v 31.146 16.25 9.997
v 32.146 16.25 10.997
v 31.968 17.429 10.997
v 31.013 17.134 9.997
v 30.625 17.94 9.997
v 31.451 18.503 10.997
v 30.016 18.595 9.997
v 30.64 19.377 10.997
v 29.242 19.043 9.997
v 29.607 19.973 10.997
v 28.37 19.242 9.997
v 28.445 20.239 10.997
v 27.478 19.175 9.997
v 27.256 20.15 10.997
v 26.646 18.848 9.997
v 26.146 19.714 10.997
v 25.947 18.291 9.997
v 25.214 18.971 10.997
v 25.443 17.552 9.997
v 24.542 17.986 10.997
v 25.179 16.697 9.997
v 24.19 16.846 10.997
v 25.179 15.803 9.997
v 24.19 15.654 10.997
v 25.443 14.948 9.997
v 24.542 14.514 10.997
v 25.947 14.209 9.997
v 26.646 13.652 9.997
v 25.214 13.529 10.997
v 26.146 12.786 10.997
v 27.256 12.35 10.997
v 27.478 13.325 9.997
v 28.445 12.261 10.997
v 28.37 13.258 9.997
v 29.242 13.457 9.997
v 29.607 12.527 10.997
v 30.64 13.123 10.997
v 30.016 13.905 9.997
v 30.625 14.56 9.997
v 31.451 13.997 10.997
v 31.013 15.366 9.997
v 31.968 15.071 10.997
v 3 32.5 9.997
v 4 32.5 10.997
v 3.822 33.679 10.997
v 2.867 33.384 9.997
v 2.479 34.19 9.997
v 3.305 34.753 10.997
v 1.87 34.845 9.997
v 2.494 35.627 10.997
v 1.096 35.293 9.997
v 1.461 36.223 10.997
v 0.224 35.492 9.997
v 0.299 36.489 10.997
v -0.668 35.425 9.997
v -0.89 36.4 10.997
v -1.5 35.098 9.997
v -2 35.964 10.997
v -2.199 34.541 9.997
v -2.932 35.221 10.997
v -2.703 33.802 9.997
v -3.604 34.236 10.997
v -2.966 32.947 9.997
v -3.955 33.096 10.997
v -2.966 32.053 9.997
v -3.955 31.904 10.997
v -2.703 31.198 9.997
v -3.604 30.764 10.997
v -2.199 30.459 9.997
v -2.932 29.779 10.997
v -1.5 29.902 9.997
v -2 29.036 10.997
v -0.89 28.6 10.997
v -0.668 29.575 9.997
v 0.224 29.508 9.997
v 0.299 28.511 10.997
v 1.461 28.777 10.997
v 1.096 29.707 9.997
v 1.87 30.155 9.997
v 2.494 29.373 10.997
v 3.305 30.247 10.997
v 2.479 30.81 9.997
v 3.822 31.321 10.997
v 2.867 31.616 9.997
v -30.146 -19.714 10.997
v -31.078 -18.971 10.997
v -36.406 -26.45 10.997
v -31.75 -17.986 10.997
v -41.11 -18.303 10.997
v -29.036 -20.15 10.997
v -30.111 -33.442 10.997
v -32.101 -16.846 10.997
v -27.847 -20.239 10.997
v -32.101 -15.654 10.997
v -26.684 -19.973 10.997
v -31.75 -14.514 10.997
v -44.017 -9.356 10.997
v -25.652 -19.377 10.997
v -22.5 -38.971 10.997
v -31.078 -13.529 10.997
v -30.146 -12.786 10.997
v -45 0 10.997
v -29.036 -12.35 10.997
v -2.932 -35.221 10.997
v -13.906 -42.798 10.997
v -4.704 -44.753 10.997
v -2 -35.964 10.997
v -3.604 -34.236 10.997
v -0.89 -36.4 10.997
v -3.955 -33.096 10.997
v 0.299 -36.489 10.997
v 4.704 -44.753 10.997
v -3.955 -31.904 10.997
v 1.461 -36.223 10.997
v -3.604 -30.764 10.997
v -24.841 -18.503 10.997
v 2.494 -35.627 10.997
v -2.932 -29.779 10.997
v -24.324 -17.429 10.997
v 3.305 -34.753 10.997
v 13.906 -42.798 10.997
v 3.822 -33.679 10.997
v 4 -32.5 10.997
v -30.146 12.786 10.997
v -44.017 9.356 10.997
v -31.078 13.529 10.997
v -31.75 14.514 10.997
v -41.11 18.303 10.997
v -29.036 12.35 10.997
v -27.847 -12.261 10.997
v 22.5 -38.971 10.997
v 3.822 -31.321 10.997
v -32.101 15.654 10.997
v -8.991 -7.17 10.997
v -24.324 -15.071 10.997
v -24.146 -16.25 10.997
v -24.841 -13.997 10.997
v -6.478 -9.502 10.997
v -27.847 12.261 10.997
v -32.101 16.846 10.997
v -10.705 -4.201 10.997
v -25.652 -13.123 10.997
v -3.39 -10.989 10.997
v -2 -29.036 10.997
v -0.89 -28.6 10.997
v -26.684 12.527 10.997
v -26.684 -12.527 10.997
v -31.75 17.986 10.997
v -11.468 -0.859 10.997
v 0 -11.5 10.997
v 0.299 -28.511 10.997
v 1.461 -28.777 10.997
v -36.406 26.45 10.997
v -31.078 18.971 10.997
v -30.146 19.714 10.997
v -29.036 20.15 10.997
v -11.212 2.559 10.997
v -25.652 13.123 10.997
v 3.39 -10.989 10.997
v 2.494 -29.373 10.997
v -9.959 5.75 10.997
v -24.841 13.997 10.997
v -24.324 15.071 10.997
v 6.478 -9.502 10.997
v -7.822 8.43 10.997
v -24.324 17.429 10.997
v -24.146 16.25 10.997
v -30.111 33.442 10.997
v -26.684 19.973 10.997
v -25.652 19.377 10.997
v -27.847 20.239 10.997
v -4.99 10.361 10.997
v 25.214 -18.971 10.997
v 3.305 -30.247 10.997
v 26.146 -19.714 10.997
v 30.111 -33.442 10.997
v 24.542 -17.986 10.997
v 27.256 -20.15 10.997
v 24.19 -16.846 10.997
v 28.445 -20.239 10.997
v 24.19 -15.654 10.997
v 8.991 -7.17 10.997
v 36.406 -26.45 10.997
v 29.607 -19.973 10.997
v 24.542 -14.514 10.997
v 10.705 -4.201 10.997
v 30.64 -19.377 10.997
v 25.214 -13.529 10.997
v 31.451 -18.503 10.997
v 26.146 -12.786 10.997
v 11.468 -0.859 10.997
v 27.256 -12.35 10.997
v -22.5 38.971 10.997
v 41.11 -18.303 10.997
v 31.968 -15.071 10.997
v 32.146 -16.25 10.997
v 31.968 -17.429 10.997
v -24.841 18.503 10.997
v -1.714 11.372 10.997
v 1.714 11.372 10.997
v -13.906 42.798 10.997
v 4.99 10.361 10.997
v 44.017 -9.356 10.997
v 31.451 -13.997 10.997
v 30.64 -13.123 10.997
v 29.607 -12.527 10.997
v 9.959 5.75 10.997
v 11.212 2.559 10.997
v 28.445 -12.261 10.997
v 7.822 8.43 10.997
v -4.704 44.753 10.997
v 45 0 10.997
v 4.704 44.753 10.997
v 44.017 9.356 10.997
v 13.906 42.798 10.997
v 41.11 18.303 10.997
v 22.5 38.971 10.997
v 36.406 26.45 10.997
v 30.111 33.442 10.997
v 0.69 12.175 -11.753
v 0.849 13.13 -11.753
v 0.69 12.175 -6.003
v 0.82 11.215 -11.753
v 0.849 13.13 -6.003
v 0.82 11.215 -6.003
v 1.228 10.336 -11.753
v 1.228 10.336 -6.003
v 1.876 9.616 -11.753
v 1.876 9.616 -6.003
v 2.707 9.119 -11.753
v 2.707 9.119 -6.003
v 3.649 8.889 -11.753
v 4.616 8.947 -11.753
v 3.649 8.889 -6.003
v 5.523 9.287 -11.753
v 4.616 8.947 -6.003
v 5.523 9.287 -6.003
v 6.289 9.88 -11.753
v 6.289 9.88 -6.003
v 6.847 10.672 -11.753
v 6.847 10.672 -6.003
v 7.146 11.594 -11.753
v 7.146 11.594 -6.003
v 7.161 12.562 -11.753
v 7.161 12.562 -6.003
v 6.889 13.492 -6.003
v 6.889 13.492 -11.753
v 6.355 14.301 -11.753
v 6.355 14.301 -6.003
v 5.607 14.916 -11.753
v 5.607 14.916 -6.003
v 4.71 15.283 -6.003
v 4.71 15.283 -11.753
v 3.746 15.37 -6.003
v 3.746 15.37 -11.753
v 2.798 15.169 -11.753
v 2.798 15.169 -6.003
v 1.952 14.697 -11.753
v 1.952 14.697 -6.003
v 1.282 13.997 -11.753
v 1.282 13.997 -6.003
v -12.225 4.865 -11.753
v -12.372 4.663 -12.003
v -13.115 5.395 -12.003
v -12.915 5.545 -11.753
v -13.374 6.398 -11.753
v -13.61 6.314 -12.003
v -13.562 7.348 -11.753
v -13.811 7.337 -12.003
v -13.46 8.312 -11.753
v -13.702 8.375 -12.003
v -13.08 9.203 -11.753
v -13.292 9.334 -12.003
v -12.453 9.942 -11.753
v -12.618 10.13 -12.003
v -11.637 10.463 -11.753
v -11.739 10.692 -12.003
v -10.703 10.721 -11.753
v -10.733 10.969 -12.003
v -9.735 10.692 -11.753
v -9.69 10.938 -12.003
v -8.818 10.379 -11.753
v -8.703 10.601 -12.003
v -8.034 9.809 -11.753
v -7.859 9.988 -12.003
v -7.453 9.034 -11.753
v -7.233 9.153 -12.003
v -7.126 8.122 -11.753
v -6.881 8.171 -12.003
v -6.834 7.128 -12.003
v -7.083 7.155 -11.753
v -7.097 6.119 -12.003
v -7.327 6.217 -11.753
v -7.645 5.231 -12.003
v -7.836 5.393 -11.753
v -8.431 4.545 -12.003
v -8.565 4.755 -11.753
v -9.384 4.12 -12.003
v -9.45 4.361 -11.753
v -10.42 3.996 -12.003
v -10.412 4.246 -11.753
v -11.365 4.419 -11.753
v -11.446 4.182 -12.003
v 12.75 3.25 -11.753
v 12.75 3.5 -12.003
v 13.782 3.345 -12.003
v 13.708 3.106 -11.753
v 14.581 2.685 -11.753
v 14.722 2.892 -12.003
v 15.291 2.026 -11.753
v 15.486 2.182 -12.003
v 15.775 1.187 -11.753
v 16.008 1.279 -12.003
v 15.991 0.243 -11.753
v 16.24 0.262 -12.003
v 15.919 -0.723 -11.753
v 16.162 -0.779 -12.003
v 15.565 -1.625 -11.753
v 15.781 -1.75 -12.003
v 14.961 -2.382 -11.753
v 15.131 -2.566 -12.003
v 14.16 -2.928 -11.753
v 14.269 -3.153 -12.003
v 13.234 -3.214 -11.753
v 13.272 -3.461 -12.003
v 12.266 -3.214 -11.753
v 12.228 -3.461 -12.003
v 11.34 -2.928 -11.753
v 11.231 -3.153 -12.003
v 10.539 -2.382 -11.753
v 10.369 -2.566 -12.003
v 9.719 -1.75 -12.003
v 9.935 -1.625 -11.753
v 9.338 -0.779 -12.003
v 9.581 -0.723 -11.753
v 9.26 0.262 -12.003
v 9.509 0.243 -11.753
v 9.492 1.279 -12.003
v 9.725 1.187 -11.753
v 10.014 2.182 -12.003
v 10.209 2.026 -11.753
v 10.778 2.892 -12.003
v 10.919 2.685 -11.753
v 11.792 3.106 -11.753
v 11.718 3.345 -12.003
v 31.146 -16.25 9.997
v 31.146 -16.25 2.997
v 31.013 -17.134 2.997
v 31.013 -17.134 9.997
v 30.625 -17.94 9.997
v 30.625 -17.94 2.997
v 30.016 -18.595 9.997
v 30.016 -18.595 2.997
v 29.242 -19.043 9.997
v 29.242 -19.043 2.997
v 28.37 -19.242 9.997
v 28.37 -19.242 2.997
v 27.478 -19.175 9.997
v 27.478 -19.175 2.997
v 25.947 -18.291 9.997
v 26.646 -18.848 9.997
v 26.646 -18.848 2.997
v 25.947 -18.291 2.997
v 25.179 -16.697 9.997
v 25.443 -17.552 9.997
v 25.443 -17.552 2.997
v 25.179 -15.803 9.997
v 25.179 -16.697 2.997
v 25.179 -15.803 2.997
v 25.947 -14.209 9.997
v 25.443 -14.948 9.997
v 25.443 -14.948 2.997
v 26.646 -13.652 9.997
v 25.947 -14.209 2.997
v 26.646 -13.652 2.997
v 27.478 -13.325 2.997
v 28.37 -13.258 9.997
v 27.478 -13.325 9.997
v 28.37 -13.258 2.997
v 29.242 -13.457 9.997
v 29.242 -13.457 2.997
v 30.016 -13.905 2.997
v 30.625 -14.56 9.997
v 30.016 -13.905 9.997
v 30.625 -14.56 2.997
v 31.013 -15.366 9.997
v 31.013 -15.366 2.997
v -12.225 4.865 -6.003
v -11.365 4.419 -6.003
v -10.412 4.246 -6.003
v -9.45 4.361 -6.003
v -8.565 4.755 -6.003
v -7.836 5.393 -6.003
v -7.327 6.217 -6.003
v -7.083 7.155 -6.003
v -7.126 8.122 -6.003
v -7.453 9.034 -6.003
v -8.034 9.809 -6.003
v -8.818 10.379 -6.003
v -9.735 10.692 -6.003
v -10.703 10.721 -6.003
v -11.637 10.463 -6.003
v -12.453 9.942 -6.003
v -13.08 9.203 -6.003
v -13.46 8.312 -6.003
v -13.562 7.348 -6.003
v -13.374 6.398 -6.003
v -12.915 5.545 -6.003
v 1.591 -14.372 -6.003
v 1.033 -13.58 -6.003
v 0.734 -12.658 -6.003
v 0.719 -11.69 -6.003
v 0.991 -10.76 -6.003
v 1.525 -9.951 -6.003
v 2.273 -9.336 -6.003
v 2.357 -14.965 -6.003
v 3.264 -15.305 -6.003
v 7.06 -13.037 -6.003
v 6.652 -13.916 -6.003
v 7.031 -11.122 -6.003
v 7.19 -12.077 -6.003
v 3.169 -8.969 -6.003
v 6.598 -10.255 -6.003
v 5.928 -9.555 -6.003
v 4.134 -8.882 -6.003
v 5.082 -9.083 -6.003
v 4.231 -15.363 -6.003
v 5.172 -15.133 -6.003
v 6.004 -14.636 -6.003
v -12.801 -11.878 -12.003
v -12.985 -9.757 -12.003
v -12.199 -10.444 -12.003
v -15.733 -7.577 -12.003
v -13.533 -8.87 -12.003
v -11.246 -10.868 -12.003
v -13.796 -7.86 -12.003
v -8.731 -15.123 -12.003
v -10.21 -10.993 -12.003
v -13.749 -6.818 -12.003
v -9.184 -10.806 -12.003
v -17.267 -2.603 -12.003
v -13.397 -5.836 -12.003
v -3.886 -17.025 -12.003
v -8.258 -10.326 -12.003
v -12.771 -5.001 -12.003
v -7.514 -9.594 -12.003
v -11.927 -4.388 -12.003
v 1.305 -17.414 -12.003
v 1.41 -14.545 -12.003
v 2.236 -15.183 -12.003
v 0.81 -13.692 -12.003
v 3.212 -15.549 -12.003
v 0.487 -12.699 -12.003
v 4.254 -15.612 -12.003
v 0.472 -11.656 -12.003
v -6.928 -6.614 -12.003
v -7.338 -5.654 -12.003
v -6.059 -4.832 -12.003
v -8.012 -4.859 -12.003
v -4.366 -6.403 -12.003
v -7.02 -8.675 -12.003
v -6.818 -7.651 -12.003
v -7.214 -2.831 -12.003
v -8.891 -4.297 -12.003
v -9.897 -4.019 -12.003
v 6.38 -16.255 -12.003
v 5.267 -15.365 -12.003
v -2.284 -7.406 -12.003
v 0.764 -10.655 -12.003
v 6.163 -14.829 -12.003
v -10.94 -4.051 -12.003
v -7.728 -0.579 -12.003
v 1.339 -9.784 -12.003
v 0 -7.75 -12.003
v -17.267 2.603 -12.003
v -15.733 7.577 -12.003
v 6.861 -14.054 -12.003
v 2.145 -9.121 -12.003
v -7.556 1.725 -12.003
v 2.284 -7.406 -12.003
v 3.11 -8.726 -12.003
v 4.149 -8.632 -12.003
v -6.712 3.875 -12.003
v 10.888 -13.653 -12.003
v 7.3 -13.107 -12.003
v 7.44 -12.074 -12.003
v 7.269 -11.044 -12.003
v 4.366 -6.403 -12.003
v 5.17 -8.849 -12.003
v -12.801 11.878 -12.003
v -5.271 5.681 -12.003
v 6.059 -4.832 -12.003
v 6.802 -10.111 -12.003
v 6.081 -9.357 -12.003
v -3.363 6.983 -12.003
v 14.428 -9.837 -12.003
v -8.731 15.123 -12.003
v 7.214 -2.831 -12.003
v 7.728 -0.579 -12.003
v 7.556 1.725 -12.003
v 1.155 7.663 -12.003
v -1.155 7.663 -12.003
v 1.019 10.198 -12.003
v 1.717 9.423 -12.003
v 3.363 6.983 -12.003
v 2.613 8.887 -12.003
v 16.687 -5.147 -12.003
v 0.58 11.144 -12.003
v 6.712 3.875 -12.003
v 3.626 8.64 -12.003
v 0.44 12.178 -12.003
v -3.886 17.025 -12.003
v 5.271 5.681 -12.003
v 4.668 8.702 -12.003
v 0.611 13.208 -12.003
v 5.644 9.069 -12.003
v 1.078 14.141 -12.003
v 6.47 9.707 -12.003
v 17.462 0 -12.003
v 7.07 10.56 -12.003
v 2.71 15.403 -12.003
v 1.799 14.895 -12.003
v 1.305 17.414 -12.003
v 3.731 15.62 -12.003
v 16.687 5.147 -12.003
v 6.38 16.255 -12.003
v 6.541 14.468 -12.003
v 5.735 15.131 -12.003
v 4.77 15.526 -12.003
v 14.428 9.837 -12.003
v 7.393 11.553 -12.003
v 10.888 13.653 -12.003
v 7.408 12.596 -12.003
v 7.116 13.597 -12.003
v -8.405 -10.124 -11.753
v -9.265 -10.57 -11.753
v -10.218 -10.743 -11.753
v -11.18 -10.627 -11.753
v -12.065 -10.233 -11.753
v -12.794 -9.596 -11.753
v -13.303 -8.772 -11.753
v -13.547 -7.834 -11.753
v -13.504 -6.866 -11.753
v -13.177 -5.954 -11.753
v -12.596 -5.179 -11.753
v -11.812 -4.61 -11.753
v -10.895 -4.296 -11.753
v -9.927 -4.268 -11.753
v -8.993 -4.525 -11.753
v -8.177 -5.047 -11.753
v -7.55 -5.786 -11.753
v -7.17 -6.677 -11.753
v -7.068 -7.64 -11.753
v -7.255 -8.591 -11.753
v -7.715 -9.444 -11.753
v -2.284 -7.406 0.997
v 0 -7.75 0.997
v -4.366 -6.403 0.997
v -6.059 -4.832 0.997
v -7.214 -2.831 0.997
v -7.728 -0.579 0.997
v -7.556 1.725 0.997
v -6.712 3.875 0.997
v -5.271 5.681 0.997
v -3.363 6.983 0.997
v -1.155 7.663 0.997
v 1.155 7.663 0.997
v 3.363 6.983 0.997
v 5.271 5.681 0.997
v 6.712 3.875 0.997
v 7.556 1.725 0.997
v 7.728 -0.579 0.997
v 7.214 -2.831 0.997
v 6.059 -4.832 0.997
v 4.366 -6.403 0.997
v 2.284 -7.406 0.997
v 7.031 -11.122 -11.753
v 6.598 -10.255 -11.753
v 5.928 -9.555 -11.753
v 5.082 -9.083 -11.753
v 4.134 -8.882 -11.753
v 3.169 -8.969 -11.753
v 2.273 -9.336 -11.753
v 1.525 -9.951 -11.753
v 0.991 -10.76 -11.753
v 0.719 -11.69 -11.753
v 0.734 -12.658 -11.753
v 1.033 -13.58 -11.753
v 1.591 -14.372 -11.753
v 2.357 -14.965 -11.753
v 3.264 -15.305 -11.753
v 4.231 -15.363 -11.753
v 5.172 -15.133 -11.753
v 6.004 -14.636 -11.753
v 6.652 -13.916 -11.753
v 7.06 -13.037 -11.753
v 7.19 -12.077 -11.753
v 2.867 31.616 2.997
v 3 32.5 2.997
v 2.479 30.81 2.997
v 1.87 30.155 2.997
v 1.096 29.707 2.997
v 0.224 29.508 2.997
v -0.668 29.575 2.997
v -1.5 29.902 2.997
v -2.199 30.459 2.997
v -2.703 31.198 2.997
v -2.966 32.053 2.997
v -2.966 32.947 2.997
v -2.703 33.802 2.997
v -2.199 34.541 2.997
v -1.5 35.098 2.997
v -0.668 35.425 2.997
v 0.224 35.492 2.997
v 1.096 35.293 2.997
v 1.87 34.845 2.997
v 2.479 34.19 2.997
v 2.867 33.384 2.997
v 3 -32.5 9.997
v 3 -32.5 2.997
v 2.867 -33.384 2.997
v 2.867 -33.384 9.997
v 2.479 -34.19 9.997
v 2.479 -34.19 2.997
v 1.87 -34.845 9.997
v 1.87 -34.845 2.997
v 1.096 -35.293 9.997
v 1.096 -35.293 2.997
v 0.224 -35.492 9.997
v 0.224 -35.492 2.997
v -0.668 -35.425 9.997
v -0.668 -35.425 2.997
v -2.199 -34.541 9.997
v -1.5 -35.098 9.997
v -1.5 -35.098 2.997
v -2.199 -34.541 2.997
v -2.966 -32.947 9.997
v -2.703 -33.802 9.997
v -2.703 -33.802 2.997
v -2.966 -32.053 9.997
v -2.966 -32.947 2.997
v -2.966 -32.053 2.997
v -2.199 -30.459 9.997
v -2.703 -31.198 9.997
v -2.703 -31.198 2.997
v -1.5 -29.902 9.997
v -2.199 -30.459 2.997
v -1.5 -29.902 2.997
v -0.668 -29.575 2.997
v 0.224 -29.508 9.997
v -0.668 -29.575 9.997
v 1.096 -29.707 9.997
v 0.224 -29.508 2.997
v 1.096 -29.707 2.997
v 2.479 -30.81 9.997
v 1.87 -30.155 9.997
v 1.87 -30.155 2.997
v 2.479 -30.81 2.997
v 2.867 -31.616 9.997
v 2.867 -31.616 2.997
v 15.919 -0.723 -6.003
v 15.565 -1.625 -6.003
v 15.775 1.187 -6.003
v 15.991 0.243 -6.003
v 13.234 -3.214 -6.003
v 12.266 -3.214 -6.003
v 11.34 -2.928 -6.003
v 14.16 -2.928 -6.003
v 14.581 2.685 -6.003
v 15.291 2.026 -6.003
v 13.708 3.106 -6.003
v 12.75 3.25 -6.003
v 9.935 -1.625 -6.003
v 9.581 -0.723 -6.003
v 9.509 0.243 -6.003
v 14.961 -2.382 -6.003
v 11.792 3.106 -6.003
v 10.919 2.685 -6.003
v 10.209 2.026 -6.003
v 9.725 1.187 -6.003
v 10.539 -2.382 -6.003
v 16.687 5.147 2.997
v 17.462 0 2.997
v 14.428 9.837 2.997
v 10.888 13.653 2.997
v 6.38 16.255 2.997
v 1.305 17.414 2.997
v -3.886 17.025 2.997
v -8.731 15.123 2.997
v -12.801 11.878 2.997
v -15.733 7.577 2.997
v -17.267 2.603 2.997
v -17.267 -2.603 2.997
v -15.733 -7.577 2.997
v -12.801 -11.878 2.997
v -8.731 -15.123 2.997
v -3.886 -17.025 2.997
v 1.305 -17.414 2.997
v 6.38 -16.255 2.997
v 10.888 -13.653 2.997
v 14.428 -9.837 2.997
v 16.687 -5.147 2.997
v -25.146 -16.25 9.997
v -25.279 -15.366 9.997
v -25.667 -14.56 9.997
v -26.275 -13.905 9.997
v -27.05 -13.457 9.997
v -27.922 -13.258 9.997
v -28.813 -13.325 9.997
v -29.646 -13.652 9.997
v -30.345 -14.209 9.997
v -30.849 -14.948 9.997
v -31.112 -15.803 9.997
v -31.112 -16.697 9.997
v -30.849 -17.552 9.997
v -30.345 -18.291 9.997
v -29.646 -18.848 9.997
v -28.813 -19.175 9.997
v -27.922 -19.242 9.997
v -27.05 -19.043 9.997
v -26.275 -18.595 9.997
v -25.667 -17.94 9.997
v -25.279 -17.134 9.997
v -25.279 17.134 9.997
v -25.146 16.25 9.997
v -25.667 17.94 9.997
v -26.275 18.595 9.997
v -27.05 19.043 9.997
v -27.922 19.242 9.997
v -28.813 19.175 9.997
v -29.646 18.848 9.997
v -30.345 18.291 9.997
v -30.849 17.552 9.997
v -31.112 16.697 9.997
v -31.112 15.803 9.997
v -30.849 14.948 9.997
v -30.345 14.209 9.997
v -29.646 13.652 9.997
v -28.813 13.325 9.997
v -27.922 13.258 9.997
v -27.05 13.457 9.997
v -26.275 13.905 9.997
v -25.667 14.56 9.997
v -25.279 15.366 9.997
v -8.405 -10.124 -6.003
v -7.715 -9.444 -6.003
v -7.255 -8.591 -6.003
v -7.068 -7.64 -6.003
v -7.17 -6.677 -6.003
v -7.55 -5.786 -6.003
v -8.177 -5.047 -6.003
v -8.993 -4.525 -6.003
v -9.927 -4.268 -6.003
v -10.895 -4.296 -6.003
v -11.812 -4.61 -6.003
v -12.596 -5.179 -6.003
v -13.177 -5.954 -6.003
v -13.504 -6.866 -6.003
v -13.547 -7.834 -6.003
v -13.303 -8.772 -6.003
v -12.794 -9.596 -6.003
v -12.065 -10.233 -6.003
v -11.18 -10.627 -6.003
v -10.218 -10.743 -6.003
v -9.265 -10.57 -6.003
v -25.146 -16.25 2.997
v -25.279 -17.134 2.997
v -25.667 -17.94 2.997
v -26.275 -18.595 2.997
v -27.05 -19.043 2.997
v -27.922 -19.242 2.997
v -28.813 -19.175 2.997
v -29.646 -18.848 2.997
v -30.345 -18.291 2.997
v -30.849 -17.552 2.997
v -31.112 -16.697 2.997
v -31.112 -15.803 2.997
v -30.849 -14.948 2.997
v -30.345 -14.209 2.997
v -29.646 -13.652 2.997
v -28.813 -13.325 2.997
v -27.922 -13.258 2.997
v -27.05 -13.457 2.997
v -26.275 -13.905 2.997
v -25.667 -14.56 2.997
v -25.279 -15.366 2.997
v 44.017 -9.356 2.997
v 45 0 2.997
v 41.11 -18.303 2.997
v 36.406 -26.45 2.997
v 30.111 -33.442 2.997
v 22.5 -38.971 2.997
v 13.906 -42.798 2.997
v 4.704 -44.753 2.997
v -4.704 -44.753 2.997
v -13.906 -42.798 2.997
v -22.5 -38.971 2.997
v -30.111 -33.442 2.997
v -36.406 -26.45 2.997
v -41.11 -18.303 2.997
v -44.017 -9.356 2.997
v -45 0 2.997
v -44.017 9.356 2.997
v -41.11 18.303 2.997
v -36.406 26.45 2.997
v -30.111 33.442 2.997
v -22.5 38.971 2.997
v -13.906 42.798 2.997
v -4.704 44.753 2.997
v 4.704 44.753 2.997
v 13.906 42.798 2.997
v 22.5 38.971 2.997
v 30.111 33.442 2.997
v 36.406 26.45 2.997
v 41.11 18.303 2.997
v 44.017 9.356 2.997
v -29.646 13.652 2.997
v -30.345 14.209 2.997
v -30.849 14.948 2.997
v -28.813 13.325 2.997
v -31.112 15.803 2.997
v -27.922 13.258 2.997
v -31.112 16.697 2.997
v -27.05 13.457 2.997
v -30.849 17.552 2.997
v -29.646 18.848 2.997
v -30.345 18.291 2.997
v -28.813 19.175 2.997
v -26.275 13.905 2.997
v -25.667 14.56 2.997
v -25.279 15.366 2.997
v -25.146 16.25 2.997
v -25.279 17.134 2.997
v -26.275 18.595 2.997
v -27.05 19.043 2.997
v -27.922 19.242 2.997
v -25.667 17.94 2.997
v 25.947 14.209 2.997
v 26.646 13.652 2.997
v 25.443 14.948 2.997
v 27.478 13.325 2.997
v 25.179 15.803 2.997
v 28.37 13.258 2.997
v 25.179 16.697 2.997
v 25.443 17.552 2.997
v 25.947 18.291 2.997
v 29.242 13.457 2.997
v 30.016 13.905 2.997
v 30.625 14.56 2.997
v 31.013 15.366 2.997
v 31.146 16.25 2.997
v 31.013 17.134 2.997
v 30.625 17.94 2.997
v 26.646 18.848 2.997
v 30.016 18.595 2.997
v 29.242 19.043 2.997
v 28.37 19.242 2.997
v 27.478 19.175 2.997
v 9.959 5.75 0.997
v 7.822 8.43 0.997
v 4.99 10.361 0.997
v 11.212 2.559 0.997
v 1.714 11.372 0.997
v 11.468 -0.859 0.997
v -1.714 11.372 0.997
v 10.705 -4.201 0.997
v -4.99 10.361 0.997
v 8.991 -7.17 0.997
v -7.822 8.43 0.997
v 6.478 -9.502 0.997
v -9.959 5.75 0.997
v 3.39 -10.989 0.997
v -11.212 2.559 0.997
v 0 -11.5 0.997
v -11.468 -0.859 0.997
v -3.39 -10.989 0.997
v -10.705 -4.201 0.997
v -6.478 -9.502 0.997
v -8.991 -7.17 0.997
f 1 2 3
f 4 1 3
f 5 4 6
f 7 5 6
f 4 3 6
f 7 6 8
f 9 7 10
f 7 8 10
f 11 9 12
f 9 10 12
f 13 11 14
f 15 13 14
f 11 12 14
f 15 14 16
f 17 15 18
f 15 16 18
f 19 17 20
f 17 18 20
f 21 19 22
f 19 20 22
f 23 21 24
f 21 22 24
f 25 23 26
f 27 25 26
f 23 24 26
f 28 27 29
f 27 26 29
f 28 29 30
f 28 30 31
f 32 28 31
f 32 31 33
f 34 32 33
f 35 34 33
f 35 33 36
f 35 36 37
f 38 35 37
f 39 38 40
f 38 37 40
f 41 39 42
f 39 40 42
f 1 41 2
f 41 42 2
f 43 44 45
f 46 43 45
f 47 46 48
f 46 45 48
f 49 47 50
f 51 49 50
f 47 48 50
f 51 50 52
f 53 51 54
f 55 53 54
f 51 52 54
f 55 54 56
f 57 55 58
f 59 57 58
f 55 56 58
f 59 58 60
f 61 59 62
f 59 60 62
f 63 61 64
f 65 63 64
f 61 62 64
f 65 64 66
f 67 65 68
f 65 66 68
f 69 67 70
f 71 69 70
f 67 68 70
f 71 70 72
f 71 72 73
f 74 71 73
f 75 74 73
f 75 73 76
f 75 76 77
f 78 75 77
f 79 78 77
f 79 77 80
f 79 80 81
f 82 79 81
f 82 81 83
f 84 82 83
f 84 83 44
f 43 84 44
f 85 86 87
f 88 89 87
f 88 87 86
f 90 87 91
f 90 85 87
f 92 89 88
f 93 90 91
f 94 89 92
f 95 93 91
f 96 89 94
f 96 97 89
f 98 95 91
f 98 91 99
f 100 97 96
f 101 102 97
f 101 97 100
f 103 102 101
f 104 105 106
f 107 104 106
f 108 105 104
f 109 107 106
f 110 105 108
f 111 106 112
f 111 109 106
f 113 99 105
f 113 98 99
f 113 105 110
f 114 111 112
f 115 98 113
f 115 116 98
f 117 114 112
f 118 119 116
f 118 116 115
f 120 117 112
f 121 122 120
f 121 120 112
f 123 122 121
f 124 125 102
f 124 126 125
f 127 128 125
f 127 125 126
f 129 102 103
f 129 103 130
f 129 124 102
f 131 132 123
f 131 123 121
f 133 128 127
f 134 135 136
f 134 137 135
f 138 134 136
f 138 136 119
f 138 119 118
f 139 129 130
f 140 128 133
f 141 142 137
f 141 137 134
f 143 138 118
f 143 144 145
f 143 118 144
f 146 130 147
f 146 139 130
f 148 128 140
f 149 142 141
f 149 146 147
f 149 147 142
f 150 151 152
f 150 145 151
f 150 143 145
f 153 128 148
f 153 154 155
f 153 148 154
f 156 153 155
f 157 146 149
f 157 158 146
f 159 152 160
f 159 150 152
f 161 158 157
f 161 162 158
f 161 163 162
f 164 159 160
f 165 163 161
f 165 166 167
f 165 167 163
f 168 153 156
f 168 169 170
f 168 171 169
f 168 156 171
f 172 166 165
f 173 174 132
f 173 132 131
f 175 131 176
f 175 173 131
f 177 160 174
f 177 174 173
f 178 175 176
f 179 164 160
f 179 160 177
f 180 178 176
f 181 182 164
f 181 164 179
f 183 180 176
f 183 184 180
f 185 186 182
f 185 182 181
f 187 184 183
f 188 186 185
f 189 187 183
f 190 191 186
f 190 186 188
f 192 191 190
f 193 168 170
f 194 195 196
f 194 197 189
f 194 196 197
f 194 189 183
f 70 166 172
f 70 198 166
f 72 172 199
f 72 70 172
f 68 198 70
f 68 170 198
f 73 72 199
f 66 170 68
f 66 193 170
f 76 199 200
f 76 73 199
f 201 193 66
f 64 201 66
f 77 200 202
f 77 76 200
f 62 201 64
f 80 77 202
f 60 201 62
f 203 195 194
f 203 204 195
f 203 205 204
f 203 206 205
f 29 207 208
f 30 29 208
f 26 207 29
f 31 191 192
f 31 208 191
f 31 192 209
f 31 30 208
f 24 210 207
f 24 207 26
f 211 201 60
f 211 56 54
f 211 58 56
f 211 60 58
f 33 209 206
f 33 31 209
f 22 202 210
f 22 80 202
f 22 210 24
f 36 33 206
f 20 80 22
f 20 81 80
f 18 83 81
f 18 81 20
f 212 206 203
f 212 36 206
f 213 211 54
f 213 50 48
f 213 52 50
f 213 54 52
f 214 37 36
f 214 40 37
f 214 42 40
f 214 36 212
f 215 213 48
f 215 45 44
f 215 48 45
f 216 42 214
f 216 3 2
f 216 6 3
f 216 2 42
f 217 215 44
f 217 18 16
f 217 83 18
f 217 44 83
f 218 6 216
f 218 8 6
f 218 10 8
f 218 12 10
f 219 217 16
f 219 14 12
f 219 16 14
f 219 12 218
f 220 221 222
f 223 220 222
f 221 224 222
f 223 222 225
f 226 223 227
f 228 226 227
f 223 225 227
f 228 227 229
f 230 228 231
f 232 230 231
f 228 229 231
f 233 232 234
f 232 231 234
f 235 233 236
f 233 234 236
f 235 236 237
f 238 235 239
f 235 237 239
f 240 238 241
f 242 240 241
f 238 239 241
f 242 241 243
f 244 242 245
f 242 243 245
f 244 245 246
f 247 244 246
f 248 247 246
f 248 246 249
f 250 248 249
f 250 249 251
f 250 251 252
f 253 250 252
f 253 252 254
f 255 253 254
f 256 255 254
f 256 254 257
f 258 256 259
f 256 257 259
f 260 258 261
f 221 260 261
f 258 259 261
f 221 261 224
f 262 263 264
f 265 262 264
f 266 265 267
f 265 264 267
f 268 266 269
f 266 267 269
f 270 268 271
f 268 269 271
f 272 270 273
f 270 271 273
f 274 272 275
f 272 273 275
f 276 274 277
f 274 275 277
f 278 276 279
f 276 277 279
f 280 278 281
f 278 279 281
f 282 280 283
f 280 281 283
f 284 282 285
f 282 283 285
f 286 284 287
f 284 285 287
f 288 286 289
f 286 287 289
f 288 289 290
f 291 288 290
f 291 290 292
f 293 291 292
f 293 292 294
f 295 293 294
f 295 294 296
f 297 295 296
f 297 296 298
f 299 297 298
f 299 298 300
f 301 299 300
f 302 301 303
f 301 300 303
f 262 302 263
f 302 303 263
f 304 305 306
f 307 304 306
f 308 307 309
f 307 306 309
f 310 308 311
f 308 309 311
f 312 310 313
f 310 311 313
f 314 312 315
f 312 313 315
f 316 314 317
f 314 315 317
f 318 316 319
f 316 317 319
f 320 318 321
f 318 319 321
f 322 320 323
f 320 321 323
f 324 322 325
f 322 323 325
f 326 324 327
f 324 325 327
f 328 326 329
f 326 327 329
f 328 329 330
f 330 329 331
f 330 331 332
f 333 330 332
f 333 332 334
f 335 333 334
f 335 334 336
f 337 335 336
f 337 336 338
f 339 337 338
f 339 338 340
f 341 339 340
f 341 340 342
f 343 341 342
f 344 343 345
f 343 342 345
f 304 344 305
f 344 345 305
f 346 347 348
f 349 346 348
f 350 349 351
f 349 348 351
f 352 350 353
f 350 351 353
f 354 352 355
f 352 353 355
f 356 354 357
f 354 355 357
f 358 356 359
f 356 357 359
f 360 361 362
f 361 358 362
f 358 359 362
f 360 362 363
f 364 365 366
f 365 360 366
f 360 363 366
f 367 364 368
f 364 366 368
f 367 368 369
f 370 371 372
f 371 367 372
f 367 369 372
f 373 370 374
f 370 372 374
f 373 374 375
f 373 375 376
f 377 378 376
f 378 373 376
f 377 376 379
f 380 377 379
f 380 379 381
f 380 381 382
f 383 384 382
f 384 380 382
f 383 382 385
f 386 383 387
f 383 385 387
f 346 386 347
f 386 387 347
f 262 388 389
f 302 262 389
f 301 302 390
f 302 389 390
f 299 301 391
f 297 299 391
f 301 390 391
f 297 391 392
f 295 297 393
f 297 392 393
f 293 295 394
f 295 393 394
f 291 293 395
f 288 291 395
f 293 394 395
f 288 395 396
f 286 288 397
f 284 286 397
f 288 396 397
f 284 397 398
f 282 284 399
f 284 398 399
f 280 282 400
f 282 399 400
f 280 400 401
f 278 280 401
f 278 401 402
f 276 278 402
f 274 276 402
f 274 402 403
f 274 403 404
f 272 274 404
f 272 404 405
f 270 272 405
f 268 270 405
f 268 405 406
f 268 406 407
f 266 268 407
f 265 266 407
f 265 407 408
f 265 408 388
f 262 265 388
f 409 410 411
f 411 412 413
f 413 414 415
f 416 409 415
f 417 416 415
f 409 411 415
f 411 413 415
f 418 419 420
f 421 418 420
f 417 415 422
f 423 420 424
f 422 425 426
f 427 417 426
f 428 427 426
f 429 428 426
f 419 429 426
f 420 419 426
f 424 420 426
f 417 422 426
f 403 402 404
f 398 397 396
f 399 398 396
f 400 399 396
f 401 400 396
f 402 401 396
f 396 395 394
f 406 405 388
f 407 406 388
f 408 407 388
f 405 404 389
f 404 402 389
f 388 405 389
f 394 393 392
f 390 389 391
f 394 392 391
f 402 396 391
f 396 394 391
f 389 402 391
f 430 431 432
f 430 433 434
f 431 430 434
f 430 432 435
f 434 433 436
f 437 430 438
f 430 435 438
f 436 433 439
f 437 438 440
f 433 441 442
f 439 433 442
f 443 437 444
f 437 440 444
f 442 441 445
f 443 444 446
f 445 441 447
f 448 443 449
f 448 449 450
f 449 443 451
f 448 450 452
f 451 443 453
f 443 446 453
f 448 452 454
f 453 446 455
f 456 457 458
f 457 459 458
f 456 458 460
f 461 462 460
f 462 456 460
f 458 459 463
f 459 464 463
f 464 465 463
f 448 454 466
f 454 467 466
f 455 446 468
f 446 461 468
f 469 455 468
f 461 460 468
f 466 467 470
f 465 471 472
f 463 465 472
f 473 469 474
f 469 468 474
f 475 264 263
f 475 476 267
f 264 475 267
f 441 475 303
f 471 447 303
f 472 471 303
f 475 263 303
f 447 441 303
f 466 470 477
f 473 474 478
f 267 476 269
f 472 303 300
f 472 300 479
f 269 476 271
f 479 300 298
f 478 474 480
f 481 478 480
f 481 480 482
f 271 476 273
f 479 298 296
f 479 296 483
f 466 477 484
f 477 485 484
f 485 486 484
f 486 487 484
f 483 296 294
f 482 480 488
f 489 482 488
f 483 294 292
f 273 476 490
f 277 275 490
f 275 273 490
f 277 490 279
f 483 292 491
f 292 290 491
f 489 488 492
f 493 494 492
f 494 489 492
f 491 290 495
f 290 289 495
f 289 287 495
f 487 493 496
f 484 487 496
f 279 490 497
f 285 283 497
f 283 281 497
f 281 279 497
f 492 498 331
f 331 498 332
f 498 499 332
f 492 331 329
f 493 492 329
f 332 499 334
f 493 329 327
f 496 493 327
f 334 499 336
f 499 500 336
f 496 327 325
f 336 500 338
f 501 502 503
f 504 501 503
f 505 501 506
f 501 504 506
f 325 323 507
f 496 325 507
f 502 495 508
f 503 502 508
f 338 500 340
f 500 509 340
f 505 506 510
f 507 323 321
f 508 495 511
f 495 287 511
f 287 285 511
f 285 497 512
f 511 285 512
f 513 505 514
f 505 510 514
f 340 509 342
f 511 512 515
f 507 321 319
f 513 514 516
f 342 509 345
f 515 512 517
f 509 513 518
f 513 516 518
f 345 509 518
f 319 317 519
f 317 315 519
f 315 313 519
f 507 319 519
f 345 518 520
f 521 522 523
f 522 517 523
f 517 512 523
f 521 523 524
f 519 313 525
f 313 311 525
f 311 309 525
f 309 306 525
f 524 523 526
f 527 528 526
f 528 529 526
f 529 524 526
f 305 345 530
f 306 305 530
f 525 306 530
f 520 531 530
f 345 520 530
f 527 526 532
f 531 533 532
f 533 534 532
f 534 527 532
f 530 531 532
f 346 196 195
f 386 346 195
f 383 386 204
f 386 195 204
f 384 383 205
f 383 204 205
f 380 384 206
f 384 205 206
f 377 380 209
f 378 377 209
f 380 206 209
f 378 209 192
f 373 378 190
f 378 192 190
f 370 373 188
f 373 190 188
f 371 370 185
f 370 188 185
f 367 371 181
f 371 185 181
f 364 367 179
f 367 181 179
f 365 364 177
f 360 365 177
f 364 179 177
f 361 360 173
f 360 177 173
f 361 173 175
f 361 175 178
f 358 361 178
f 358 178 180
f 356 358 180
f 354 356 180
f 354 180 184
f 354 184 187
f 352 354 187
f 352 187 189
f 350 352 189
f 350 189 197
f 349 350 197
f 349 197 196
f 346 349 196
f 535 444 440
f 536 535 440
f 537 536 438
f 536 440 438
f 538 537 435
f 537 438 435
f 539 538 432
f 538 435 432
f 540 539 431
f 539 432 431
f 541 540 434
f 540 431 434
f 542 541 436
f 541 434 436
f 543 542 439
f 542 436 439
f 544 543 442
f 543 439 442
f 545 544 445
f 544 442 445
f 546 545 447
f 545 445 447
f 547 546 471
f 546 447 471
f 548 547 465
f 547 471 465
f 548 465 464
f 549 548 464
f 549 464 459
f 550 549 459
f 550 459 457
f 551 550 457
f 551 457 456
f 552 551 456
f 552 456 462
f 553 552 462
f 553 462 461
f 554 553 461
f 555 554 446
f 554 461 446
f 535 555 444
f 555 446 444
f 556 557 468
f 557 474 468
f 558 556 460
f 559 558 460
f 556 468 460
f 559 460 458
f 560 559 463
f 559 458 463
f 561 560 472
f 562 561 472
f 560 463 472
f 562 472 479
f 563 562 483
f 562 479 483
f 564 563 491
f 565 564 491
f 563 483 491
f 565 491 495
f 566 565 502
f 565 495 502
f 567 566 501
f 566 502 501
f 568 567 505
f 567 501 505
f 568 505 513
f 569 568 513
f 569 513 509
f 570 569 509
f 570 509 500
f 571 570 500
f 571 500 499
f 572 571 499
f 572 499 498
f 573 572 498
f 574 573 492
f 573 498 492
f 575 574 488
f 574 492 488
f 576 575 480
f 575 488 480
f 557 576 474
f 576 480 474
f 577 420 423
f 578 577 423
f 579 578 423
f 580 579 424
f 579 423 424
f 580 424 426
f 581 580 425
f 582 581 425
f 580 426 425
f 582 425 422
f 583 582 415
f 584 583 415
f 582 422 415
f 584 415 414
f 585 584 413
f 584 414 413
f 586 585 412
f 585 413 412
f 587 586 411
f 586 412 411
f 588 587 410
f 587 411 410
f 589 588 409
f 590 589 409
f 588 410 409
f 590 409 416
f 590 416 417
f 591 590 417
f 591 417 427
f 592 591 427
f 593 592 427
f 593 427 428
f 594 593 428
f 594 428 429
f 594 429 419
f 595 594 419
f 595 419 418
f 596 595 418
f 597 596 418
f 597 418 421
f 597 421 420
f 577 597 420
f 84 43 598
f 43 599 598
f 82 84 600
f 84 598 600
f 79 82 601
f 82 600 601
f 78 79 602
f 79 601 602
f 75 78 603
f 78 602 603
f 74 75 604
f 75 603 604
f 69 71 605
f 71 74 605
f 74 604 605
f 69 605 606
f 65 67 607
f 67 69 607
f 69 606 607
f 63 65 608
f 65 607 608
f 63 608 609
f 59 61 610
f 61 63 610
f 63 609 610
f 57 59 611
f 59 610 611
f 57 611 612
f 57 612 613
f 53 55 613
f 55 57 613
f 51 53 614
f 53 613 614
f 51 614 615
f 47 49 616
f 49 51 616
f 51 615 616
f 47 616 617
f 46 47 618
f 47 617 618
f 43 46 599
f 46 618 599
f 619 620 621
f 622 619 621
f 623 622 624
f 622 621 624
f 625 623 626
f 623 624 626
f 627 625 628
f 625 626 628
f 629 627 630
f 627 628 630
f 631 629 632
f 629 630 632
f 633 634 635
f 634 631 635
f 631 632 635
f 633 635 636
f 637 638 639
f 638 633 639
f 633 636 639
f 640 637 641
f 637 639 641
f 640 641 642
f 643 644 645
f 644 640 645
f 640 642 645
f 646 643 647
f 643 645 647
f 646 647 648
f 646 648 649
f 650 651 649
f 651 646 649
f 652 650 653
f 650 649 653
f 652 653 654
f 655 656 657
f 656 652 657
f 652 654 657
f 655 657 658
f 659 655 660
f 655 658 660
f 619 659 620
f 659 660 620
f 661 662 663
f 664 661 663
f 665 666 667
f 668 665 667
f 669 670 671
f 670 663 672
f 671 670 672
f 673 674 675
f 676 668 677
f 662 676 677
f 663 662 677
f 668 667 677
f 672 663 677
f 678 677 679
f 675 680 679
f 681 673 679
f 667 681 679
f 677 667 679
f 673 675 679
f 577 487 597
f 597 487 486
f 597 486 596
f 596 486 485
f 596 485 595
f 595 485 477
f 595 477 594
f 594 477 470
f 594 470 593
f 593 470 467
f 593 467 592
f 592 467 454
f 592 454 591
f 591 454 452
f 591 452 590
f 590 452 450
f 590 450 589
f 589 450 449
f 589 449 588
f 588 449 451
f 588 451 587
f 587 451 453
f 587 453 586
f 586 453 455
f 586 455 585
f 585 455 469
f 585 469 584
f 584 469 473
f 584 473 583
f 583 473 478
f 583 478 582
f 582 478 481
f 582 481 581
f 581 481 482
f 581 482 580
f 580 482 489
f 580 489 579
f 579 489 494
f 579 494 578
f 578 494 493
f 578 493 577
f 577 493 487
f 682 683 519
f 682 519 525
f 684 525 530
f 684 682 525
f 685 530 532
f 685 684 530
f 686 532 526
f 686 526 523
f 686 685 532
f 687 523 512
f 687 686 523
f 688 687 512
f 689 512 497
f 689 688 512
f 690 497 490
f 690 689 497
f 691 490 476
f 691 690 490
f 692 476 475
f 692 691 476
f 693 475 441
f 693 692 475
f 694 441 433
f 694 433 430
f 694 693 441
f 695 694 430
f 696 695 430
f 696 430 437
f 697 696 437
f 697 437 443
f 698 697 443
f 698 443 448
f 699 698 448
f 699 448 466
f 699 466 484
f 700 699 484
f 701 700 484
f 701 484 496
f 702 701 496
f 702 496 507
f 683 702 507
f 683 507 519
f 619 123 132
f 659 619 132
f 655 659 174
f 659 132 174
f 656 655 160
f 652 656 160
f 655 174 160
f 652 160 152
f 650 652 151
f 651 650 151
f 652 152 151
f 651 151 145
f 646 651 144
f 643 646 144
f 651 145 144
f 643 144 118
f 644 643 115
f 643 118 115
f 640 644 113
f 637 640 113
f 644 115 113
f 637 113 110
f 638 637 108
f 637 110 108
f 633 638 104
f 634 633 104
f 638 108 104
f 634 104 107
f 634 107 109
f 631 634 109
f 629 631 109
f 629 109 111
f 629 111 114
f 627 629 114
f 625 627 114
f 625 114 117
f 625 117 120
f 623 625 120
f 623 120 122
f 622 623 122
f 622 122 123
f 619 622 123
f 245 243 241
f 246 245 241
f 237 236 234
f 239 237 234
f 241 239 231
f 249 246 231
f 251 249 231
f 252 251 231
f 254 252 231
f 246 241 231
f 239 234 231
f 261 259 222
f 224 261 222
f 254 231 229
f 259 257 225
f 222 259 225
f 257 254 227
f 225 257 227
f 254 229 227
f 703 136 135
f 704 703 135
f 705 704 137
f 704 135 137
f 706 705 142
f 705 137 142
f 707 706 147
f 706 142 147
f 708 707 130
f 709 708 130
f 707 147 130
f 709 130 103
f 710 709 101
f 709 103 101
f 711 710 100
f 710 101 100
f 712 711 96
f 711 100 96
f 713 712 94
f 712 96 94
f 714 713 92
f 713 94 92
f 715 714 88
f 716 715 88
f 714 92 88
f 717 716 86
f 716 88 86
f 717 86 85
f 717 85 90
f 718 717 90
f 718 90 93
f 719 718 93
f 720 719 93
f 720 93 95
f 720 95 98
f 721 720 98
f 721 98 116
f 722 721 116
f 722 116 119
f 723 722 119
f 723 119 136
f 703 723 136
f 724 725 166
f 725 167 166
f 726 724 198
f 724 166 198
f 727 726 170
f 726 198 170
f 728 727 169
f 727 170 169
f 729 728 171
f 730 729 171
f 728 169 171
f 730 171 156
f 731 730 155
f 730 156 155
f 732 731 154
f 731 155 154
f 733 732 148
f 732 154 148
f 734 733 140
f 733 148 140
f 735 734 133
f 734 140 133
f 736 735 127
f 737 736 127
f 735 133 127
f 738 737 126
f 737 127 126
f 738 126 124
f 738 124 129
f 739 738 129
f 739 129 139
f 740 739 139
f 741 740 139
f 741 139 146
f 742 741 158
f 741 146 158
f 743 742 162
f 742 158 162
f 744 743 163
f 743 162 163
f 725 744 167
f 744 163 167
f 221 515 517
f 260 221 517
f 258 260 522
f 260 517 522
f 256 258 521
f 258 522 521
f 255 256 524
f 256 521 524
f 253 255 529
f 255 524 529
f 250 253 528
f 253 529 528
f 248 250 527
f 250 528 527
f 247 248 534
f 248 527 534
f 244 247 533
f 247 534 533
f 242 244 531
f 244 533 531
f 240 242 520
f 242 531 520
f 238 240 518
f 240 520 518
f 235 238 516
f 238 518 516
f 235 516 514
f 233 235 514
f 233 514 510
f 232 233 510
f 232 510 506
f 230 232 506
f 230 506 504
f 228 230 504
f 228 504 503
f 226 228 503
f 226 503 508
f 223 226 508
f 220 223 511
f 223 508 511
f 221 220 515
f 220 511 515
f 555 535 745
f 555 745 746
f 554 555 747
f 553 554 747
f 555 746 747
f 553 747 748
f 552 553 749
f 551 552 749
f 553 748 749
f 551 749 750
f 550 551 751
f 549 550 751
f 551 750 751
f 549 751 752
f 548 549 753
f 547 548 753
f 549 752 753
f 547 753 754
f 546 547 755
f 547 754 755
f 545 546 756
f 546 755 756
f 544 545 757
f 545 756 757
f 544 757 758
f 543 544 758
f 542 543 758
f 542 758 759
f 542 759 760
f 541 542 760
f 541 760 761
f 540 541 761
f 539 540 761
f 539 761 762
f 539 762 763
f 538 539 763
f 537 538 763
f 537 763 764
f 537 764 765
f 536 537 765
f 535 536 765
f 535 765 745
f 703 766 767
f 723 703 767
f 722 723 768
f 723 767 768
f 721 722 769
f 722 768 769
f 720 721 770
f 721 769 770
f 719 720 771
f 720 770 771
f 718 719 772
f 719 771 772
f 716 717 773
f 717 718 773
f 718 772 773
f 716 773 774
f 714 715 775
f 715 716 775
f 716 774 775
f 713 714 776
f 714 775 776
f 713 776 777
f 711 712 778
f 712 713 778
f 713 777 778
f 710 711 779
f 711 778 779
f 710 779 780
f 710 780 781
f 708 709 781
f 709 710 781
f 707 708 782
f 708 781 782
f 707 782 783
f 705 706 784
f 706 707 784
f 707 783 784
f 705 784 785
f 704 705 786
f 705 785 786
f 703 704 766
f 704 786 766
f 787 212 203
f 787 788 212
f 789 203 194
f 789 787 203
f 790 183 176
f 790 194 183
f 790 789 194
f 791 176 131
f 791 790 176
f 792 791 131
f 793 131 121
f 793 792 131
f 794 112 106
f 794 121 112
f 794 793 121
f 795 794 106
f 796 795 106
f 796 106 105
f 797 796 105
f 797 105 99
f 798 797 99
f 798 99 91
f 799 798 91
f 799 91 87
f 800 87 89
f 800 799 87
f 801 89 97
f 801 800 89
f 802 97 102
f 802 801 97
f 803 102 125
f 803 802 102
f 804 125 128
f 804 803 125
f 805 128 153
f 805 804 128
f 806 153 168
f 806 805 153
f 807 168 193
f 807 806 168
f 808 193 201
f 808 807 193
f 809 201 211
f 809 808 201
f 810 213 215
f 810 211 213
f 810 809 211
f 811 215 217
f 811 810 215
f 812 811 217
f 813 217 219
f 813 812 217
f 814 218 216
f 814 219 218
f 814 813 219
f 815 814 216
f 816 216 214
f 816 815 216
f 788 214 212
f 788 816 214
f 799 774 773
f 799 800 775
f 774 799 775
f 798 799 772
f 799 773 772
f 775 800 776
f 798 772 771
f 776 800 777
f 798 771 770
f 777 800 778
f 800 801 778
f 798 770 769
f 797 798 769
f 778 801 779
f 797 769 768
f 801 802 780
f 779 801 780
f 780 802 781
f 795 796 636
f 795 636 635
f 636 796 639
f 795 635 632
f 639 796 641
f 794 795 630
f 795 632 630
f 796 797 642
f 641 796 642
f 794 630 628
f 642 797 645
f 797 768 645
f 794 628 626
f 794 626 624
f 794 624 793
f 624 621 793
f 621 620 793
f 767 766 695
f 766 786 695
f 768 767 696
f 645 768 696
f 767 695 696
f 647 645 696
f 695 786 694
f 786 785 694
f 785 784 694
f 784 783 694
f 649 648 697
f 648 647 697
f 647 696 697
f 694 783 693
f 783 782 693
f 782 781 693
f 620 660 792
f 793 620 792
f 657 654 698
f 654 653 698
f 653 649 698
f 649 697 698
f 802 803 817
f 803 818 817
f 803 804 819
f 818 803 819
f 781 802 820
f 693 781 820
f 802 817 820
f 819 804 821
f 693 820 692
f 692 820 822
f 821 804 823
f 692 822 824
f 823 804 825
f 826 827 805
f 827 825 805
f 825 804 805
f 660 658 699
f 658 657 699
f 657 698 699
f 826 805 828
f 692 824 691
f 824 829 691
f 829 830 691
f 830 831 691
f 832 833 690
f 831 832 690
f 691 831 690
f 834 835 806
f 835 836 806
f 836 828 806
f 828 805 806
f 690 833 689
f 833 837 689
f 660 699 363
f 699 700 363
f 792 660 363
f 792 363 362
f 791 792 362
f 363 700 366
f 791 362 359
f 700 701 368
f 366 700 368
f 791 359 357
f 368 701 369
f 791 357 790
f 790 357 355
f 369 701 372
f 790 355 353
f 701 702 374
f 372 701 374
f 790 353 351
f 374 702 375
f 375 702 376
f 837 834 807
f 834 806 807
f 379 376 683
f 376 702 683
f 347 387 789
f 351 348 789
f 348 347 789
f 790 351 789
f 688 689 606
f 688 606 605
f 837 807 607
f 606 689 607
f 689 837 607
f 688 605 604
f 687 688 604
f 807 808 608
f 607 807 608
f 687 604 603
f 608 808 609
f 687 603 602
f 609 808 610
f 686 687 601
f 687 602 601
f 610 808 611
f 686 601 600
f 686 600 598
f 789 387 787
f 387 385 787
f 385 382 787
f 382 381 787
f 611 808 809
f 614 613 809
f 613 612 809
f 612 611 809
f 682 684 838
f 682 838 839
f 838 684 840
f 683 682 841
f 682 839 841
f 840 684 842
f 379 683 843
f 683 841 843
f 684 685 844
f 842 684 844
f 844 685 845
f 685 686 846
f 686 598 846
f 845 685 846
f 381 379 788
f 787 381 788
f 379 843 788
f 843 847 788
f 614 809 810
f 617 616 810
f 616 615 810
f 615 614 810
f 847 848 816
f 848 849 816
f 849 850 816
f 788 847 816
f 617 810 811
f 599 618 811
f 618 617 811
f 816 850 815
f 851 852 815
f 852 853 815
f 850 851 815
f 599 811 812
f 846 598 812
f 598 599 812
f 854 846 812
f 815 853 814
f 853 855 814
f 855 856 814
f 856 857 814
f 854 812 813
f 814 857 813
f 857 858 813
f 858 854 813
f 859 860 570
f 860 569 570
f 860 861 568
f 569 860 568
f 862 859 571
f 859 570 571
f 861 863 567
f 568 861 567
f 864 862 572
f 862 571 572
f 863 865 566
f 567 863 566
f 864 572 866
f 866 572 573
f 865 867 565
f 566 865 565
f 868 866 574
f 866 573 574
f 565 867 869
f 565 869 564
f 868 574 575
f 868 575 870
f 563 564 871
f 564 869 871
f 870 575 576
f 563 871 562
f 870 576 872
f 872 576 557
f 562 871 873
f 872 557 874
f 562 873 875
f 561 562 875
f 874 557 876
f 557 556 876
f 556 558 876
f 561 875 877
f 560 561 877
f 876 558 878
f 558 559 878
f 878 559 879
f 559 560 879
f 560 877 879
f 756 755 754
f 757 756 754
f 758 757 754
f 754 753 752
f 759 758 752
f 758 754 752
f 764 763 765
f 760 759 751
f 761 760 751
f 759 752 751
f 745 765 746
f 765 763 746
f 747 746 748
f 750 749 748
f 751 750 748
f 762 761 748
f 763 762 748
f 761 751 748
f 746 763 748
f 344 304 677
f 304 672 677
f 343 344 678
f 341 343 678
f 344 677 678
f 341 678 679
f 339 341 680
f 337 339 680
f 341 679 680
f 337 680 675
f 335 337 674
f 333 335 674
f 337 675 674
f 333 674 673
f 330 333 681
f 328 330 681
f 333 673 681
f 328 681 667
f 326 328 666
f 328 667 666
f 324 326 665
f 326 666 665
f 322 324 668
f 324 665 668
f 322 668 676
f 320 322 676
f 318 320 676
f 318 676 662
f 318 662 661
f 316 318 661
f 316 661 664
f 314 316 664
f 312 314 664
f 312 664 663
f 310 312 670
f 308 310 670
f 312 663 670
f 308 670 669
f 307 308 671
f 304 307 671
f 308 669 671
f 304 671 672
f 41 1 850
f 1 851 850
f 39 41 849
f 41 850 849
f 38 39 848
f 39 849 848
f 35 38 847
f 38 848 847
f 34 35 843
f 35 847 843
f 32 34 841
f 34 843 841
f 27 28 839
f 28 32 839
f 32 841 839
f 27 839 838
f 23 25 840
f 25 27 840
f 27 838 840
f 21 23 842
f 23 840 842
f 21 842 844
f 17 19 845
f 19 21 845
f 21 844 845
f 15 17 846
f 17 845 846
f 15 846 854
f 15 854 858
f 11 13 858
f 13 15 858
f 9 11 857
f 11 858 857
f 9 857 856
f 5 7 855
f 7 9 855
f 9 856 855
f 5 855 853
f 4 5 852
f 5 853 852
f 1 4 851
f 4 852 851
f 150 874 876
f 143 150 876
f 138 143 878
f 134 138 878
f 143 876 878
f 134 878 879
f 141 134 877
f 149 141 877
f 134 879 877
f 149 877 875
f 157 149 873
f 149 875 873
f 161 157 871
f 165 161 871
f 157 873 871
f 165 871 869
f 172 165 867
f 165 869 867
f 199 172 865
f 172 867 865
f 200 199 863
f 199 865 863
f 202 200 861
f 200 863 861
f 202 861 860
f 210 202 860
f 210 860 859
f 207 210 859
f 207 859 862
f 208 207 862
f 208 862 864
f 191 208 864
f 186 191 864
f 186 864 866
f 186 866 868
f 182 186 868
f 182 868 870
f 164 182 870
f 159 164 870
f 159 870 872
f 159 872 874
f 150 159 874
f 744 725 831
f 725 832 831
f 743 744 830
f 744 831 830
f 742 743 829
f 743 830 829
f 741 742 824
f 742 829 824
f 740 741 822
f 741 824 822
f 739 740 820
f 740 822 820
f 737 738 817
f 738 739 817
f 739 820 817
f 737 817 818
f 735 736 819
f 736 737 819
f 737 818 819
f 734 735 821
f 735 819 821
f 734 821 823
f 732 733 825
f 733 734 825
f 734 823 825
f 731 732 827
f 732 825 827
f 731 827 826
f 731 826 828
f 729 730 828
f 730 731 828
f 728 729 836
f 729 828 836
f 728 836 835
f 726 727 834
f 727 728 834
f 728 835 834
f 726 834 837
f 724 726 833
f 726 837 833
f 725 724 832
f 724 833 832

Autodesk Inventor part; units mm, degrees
ref_plane "YZ Plane" through (0, 0, 0) normal (1, 0, 0) x (0, 1, 0)
ref_plane "Work Plane1" through (0, 0, 2.9972) normal (0, 0, 1) x (1, 0, 0)
sketch "Sketch1" plane through (0, 0, 2.9972) normal (0, 0, 1) x (1, 0, 0)
  circle A0 centre (0, 0) radius 17.4625
  circle A1 centre (0, 0) radius 32.5 construction
  circle A2 centre (0, 0) radius 45
  circle A3 centre (0, -32.5) radius 3
  circle A4 centre (28.1458, -16.25) radius 3
  circle A5 centre (28.1458, 16.25) radius 3
  circle A6 centre (0, 32.5) radius 3
  circle A7 centre (-28.1458, 16.25) radius 3
  circle A8 centre (-28.1458, -16.25) radius 3
  dimension "d1" = 65
  dimension "d0" = 34.925
  dimension "d2" = 90
  dimension "d3" = 6
  dimension "d6" = 360
extrude "Extrusion1" add sketch "Sketch1" along normal blind 8 contours A0 | A2
ref_plane "Work Plane2" through (-75, -75, -12) normal (0, 0, -1) x (0, 1, 0)
extrude "Extrusion2" add sketch "Sketch1" against normal blind 15 contours A0
sketch "Sketch4" plane through (0, 0, 10.9972) normal (0, 0, 1) x (1, 0, 0)
  point P0 (0, 0)
  point P1 (0, 0)
hole "Hole1" at (0, 0, 10.9972) direction (0, 0, -1) diameter 15.5 end through all counterbore diameter 23 counterbore depth 10
chamfer "Chamfer1" distance 1 angle 45 6 edges at (-3, 32.5, 10.9972) (25.1458, 16.25, 10.9972) (25.1458, -16.25, 10.9972) (-3, -32.5, 10.9972) (-31.1458, -16.25, 10.9972) (-31.1458, 16.25, 10.9972)
sketch "Sketch5" plane through (0, 0, -12.0028) normal (0, 0, -1) x (-1, 0, 0)
  circle A0 centre (0, 0) radius 12.75 construction
  line L0 (-12.75, 0) -> (0, 0) construction
  dimension "d37" = 25.5
hole "Hole2" at (12.75, 0, -12.0028) direction (0, 0, 1) diameter 6.5 depth 6 countersink diameter 7 countersink angle 90
pattern_circular "Circular Pattern1" count 5 over 360 about axis through (0, 0, 2.9972) along (0, 0, -1) of "Hole2"
properties part number "output pin holder"
